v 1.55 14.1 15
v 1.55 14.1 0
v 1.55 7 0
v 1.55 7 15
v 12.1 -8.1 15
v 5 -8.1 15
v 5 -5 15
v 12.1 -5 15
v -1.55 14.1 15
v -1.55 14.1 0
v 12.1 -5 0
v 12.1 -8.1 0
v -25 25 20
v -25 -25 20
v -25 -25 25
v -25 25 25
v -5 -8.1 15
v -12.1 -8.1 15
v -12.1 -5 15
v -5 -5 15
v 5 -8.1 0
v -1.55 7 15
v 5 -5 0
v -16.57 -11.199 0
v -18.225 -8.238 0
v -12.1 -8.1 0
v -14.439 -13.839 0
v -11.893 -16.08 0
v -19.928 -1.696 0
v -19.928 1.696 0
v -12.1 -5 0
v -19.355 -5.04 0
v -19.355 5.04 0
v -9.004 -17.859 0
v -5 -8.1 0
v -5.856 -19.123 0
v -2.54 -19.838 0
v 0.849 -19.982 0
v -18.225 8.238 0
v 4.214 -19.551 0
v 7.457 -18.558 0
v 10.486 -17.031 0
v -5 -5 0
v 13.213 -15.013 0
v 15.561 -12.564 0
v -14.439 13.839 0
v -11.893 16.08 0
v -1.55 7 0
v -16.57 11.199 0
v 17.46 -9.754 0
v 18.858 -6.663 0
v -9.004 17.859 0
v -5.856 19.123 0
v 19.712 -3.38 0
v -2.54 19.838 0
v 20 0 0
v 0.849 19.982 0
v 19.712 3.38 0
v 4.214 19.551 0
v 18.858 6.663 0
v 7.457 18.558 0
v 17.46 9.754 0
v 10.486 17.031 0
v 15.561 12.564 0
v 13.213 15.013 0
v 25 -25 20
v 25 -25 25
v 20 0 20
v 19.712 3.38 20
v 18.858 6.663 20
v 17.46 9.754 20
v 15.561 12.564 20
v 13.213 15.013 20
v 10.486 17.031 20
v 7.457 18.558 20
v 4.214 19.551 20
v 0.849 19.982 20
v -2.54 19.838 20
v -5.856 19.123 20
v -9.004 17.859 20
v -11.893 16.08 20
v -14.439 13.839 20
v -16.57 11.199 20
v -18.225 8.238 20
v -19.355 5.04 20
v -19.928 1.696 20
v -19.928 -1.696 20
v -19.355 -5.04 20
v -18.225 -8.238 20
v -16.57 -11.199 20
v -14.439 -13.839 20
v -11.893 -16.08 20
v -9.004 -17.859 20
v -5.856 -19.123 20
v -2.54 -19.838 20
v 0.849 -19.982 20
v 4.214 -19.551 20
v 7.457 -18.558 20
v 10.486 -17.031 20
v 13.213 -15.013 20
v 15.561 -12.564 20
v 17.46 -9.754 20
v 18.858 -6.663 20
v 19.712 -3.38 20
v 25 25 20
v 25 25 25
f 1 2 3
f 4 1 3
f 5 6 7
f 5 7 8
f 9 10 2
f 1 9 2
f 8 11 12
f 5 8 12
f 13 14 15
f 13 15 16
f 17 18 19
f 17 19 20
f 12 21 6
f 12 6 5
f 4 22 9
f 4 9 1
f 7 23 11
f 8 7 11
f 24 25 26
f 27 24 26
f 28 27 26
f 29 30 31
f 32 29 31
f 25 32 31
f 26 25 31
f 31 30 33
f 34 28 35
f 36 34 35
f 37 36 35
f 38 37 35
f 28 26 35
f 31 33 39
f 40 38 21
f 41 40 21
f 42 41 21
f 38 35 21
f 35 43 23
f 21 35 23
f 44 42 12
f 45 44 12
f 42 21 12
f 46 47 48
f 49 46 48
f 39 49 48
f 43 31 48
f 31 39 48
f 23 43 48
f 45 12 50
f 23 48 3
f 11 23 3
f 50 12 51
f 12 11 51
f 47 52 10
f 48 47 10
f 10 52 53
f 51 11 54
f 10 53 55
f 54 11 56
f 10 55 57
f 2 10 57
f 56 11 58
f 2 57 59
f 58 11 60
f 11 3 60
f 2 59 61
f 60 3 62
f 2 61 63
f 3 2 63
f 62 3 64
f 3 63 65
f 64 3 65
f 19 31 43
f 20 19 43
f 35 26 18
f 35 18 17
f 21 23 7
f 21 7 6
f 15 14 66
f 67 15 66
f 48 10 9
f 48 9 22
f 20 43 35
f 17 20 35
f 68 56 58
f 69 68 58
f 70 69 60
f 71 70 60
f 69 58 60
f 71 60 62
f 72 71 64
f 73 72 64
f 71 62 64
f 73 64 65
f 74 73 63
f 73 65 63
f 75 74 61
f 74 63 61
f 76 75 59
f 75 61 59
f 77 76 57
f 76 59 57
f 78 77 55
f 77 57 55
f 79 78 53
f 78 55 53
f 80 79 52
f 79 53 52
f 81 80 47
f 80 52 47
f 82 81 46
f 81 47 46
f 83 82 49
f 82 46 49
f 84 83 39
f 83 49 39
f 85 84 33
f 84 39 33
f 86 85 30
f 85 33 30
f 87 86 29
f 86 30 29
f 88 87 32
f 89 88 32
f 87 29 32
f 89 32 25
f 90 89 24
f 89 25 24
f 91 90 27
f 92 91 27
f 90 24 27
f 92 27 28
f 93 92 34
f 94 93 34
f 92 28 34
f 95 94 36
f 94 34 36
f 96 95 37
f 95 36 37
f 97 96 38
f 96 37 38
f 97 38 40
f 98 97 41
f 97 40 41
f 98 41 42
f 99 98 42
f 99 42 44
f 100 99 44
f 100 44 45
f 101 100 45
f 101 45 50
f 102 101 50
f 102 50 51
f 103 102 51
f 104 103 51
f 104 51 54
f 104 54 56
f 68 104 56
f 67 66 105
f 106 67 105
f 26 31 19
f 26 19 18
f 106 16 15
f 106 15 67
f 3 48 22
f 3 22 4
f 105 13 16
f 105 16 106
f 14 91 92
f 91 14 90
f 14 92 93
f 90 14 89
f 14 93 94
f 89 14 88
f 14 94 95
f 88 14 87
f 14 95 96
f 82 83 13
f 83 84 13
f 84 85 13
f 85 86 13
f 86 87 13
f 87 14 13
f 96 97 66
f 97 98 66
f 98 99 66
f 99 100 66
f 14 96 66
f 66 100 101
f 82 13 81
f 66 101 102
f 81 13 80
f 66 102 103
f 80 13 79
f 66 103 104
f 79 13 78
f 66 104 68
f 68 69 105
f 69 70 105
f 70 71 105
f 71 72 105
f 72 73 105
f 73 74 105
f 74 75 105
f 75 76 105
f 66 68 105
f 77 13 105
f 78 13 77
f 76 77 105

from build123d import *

# Parameters (mm, degrees)
F0_R     = 20
F1_DEPTH = 20
F2_W     = 3.1
F2_H     = 7.1
F2_W_2   = 7.1
F2_H_2   = 3.1
F3_DEPTH = 15
F4_W     = 50
F4_H     = 50
F5_DEPTH = 5


with BuildPart() as f1:
    # F0 (on Top) → F1 (new body)
    with BuildSketch(Plane.XY):
        Circle(F0_R)
    extrude(amount=F1_DEPTH)

    # F2 (on face) → F3 (cut)
    with BuildSketch(Plane(origin=(0, 0, 0), x_dir=(1, 0, 0), z_dir=(0, 0, -1))):
        with Locations((0, -10.55)):
            Rectangle(F2_W, F2_H)
        with Locations((8.55, 6.55)):
            Rectangle(F2_W_2, F2_H_2)
        with Locations((-8.55, 6.55)):
            Rectangle(F2_W_2, F2_H_2)
    extrude(amount=-F3_DEPTH, mode=Mode.SUBTRACT)

    # F4 (on face) → F5 (join)
    with BuildSketch(Plane.XY.offset(20)):
        Rectangle(F4_W, F4_H)
    extrude(amount=F5_DEPTH)


solid = f1.part
